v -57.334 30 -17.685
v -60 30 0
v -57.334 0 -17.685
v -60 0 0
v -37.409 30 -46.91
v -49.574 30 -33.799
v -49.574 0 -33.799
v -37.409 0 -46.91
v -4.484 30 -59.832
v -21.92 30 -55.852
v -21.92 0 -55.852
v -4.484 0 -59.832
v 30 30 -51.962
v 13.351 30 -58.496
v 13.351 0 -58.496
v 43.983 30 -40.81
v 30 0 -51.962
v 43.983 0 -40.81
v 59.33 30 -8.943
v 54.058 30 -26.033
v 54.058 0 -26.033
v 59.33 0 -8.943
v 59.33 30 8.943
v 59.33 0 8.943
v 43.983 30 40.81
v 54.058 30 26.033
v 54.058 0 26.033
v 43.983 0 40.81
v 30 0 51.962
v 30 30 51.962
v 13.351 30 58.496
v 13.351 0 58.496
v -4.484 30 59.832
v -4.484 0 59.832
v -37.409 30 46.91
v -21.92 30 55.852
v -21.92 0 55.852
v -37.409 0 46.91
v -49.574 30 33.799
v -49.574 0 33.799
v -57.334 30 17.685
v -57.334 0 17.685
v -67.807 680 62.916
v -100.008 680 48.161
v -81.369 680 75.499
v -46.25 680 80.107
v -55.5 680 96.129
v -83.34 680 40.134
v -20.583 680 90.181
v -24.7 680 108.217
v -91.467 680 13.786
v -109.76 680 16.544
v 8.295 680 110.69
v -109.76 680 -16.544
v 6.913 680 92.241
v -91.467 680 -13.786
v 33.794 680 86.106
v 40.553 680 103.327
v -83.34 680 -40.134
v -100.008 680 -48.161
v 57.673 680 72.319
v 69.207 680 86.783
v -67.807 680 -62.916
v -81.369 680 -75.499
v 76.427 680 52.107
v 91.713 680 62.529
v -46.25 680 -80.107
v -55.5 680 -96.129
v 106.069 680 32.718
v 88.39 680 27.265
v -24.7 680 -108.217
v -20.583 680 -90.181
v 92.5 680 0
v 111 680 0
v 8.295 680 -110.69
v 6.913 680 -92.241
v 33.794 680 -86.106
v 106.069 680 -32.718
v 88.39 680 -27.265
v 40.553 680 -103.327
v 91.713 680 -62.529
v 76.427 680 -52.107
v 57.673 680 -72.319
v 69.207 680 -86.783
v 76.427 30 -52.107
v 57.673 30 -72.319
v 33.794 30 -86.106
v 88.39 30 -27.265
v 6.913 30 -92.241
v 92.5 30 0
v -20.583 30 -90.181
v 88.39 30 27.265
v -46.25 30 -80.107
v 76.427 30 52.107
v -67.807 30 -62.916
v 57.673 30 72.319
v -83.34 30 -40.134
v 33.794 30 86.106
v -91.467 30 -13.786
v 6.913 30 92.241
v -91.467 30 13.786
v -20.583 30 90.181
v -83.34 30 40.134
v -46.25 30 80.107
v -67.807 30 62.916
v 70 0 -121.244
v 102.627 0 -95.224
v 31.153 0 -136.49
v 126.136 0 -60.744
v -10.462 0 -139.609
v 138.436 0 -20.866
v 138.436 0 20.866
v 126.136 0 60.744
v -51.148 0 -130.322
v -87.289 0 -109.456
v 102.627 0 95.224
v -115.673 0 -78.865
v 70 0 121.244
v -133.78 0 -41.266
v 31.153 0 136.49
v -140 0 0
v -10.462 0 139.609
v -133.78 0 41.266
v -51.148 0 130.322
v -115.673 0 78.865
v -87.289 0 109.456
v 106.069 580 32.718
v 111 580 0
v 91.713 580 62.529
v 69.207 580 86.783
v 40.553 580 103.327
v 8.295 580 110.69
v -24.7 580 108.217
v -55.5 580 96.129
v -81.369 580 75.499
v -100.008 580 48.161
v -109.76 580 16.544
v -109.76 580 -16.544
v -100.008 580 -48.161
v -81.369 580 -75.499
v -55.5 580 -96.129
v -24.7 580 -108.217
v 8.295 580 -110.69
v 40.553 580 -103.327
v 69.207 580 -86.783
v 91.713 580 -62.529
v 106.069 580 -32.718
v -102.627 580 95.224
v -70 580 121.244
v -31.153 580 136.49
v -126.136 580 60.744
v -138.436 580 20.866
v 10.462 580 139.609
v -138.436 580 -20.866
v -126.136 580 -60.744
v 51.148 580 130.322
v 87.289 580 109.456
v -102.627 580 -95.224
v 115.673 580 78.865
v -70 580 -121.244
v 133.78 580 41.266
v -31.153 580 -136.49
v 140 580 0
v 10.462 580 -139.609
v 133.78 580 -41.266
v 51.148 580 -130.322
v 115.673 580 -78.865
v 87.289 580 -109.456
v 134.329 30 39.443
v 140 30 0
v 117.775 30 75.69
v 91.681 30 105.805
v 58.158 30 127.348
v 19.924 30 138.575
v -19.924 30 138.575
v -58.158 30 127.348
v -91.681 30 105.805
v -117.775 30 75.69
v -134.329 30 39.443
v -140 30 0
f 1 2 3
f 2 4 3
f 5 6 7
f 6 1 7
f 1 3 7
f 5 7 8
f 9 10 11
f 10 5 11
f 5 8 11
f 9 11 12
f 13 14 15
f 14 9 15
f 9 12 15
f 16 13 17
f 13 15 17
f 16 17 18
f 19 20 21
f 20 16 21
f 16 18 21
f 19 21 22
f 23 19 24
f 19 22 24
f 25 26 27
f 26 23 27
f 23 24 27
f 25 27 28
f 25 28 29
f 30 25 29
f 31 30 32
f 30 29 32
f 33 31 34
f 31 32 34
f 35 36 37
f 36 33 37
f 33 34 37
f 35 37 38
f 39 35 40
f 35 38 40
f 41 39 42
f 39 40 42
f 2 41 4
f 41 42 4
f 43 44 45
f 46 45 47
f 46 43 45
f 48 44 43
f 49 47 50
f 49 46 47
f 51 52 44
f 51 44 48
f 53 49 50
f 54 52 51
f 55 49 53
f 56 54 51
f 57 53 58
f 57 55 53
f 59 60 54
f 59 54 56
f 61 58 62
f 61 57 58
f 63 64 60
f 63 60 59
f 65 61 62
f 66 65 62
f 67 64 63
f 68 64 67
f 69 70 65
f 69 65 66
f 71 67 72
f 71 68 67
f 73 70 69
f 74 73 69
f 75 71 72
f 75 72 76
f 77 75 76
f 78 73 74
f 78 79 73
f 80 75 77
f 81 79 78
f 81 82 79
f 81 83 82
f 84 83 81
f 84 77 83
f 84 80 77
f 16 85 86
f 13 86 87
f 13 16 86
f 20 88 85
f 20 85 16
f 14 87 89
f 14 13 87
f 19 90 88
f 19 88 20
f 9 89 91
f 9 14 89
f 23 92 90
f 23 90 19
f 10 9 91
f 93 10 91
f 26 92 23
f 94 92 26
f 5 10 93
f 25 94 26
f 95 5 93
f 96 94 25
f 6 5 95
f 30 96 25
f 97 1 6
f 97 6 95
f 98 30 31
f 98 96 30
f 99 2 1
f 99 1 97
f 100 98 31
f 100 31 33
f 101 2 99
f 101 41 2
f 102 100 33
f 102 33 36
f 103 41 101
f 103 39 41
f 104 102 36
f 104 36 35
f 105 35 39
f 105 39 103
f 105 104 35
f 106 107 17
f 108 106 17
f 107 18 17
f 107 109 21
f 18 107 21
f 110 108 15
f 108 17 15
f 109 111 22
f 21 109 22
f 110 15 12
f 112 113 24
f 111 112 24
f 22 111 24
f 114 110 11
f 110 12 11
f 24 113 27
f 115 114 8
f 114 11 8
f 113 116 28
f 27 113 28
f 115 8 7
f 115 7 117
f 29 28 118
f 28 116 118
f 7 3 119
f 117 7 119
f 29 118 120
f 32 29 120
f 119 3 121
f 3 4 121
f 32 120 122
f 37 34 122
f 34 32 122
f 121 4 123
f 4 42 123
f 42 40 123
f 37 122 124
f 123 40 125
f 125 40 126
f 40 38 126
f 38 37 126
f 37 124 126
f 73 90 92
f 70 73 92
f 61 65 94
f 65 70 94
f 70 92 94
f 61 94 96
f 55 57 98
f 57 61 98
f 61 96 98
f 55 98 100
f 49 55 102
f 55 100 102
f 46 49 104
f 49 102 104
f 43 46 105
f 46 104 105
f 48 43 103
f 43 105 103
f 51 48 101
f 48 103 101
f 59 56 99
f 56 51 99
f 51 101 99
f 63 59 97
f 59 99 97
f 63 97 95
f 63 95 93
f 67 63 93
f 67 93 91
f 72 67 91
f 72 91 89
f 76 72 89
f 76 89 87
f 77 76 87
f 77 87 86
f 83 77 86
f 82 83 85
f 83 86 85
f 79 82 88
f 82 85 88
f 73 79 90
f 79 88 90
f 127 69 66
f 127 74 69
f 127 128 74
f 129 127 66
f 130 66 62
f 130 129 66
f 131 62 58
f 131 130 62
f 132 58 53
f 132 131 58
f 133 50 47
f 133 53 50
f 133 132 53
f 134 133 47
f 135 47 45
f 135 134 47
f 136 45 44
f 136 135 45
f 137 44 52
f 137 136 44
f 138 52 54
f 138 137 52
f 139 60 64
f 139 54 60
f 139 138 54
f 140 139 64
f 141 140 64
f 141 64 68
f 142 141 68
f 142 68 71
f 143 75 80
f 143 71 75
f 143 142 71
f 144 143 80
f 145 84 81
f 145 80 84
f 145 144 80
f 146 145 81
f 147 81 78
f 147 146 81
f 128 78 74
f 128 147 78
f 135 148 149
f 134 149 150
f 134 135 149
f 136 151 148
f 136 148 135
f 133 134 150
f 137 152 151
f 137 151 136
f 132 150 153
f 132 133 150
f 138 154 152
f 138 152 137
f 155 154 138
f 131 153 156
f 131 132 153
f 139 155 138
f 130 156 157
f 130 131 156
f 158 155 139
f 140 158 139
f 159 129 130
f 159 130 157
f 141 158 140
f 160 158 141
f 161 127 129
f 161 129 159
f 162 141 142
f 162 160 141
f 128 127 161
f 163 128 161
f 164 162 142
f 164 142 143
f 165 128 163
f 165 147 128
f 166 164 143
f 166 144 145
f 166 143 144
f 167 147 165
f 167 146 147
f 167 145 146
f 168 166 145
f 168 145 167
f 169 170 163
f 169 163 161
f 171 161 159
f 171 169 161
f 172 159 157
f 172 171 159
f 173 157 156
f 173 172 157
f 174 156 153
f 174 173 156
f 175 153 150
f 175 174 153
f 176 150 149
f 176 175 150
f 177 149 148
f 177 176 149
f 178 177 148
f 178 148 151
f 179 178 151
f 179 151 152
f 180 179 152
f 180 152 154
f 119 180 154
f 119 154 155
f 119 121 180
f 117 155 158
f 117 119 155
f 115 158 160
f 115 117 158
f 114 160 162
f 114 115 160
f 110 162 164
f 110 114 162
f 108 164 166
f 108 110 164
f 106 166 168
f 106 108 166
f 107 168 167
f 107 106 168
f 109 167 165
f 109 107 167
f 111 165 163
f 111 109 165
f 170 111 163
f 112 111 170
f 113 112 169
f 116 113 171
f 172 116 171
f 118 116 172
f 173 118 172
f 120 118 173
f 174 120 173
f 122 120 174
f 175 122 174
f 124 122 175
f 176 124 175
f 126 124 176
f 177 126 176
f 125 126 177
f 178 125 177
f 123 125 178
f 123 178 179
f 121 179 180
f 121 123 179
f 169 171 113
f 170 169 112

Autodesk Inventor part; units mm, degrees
ref_plane "YZ Plane" through (0, 0, 0) normal (1, 0, 0) x (0, 1, 0)
ref_plane "XZ Plane" through (0, 0, 0) normal (0, 1, 0) x (-1, 0, 0)
ref_plane "XY Plane" through (0, 0, 0) normal (0, 0, 1) x (1, 0, 0)
sketch "Sketch1" plane through (0, 0, 0) normal (0, 1, 0) x (-1, 0, 0)
  circle A0 centre (0, 0) radius 140
  circle A1 centre (0, 0) radius 60
  dimension "d0" = 280
  dimension "d1" = 120
extrude "Extrusion1" add sketch "Sketch1" along normal blind 30
sketch "Sketch3" plane through (0, 30, 0) normal (0, 1, 0) x (1, 0, 0)
  circle A0 centre (0, 0) radius 92.5
  circle A1 centre (0, 0) radius 140
  dimension "d12" = 185
  dimension "d18" = 280
extrude "Extrusion3" add sketch "Sketch3" along normal blind 550
sketch "Sketch4" plane through (0, 580, 0) normal (0, 1, 0) x (1, 0, 0)
  circle A0 centre (0, 0) radius 60 projected
  circle A1 centre (0, 0) radius 111
  circle A2 centre (0, 0) radius 92.5
  dimension "d15" = 222
  dimension "d19" = 185
extrude "Extrusion4" add sketch "Sketch4" along normal blind 100 contours A1
properties part number "taoa"
